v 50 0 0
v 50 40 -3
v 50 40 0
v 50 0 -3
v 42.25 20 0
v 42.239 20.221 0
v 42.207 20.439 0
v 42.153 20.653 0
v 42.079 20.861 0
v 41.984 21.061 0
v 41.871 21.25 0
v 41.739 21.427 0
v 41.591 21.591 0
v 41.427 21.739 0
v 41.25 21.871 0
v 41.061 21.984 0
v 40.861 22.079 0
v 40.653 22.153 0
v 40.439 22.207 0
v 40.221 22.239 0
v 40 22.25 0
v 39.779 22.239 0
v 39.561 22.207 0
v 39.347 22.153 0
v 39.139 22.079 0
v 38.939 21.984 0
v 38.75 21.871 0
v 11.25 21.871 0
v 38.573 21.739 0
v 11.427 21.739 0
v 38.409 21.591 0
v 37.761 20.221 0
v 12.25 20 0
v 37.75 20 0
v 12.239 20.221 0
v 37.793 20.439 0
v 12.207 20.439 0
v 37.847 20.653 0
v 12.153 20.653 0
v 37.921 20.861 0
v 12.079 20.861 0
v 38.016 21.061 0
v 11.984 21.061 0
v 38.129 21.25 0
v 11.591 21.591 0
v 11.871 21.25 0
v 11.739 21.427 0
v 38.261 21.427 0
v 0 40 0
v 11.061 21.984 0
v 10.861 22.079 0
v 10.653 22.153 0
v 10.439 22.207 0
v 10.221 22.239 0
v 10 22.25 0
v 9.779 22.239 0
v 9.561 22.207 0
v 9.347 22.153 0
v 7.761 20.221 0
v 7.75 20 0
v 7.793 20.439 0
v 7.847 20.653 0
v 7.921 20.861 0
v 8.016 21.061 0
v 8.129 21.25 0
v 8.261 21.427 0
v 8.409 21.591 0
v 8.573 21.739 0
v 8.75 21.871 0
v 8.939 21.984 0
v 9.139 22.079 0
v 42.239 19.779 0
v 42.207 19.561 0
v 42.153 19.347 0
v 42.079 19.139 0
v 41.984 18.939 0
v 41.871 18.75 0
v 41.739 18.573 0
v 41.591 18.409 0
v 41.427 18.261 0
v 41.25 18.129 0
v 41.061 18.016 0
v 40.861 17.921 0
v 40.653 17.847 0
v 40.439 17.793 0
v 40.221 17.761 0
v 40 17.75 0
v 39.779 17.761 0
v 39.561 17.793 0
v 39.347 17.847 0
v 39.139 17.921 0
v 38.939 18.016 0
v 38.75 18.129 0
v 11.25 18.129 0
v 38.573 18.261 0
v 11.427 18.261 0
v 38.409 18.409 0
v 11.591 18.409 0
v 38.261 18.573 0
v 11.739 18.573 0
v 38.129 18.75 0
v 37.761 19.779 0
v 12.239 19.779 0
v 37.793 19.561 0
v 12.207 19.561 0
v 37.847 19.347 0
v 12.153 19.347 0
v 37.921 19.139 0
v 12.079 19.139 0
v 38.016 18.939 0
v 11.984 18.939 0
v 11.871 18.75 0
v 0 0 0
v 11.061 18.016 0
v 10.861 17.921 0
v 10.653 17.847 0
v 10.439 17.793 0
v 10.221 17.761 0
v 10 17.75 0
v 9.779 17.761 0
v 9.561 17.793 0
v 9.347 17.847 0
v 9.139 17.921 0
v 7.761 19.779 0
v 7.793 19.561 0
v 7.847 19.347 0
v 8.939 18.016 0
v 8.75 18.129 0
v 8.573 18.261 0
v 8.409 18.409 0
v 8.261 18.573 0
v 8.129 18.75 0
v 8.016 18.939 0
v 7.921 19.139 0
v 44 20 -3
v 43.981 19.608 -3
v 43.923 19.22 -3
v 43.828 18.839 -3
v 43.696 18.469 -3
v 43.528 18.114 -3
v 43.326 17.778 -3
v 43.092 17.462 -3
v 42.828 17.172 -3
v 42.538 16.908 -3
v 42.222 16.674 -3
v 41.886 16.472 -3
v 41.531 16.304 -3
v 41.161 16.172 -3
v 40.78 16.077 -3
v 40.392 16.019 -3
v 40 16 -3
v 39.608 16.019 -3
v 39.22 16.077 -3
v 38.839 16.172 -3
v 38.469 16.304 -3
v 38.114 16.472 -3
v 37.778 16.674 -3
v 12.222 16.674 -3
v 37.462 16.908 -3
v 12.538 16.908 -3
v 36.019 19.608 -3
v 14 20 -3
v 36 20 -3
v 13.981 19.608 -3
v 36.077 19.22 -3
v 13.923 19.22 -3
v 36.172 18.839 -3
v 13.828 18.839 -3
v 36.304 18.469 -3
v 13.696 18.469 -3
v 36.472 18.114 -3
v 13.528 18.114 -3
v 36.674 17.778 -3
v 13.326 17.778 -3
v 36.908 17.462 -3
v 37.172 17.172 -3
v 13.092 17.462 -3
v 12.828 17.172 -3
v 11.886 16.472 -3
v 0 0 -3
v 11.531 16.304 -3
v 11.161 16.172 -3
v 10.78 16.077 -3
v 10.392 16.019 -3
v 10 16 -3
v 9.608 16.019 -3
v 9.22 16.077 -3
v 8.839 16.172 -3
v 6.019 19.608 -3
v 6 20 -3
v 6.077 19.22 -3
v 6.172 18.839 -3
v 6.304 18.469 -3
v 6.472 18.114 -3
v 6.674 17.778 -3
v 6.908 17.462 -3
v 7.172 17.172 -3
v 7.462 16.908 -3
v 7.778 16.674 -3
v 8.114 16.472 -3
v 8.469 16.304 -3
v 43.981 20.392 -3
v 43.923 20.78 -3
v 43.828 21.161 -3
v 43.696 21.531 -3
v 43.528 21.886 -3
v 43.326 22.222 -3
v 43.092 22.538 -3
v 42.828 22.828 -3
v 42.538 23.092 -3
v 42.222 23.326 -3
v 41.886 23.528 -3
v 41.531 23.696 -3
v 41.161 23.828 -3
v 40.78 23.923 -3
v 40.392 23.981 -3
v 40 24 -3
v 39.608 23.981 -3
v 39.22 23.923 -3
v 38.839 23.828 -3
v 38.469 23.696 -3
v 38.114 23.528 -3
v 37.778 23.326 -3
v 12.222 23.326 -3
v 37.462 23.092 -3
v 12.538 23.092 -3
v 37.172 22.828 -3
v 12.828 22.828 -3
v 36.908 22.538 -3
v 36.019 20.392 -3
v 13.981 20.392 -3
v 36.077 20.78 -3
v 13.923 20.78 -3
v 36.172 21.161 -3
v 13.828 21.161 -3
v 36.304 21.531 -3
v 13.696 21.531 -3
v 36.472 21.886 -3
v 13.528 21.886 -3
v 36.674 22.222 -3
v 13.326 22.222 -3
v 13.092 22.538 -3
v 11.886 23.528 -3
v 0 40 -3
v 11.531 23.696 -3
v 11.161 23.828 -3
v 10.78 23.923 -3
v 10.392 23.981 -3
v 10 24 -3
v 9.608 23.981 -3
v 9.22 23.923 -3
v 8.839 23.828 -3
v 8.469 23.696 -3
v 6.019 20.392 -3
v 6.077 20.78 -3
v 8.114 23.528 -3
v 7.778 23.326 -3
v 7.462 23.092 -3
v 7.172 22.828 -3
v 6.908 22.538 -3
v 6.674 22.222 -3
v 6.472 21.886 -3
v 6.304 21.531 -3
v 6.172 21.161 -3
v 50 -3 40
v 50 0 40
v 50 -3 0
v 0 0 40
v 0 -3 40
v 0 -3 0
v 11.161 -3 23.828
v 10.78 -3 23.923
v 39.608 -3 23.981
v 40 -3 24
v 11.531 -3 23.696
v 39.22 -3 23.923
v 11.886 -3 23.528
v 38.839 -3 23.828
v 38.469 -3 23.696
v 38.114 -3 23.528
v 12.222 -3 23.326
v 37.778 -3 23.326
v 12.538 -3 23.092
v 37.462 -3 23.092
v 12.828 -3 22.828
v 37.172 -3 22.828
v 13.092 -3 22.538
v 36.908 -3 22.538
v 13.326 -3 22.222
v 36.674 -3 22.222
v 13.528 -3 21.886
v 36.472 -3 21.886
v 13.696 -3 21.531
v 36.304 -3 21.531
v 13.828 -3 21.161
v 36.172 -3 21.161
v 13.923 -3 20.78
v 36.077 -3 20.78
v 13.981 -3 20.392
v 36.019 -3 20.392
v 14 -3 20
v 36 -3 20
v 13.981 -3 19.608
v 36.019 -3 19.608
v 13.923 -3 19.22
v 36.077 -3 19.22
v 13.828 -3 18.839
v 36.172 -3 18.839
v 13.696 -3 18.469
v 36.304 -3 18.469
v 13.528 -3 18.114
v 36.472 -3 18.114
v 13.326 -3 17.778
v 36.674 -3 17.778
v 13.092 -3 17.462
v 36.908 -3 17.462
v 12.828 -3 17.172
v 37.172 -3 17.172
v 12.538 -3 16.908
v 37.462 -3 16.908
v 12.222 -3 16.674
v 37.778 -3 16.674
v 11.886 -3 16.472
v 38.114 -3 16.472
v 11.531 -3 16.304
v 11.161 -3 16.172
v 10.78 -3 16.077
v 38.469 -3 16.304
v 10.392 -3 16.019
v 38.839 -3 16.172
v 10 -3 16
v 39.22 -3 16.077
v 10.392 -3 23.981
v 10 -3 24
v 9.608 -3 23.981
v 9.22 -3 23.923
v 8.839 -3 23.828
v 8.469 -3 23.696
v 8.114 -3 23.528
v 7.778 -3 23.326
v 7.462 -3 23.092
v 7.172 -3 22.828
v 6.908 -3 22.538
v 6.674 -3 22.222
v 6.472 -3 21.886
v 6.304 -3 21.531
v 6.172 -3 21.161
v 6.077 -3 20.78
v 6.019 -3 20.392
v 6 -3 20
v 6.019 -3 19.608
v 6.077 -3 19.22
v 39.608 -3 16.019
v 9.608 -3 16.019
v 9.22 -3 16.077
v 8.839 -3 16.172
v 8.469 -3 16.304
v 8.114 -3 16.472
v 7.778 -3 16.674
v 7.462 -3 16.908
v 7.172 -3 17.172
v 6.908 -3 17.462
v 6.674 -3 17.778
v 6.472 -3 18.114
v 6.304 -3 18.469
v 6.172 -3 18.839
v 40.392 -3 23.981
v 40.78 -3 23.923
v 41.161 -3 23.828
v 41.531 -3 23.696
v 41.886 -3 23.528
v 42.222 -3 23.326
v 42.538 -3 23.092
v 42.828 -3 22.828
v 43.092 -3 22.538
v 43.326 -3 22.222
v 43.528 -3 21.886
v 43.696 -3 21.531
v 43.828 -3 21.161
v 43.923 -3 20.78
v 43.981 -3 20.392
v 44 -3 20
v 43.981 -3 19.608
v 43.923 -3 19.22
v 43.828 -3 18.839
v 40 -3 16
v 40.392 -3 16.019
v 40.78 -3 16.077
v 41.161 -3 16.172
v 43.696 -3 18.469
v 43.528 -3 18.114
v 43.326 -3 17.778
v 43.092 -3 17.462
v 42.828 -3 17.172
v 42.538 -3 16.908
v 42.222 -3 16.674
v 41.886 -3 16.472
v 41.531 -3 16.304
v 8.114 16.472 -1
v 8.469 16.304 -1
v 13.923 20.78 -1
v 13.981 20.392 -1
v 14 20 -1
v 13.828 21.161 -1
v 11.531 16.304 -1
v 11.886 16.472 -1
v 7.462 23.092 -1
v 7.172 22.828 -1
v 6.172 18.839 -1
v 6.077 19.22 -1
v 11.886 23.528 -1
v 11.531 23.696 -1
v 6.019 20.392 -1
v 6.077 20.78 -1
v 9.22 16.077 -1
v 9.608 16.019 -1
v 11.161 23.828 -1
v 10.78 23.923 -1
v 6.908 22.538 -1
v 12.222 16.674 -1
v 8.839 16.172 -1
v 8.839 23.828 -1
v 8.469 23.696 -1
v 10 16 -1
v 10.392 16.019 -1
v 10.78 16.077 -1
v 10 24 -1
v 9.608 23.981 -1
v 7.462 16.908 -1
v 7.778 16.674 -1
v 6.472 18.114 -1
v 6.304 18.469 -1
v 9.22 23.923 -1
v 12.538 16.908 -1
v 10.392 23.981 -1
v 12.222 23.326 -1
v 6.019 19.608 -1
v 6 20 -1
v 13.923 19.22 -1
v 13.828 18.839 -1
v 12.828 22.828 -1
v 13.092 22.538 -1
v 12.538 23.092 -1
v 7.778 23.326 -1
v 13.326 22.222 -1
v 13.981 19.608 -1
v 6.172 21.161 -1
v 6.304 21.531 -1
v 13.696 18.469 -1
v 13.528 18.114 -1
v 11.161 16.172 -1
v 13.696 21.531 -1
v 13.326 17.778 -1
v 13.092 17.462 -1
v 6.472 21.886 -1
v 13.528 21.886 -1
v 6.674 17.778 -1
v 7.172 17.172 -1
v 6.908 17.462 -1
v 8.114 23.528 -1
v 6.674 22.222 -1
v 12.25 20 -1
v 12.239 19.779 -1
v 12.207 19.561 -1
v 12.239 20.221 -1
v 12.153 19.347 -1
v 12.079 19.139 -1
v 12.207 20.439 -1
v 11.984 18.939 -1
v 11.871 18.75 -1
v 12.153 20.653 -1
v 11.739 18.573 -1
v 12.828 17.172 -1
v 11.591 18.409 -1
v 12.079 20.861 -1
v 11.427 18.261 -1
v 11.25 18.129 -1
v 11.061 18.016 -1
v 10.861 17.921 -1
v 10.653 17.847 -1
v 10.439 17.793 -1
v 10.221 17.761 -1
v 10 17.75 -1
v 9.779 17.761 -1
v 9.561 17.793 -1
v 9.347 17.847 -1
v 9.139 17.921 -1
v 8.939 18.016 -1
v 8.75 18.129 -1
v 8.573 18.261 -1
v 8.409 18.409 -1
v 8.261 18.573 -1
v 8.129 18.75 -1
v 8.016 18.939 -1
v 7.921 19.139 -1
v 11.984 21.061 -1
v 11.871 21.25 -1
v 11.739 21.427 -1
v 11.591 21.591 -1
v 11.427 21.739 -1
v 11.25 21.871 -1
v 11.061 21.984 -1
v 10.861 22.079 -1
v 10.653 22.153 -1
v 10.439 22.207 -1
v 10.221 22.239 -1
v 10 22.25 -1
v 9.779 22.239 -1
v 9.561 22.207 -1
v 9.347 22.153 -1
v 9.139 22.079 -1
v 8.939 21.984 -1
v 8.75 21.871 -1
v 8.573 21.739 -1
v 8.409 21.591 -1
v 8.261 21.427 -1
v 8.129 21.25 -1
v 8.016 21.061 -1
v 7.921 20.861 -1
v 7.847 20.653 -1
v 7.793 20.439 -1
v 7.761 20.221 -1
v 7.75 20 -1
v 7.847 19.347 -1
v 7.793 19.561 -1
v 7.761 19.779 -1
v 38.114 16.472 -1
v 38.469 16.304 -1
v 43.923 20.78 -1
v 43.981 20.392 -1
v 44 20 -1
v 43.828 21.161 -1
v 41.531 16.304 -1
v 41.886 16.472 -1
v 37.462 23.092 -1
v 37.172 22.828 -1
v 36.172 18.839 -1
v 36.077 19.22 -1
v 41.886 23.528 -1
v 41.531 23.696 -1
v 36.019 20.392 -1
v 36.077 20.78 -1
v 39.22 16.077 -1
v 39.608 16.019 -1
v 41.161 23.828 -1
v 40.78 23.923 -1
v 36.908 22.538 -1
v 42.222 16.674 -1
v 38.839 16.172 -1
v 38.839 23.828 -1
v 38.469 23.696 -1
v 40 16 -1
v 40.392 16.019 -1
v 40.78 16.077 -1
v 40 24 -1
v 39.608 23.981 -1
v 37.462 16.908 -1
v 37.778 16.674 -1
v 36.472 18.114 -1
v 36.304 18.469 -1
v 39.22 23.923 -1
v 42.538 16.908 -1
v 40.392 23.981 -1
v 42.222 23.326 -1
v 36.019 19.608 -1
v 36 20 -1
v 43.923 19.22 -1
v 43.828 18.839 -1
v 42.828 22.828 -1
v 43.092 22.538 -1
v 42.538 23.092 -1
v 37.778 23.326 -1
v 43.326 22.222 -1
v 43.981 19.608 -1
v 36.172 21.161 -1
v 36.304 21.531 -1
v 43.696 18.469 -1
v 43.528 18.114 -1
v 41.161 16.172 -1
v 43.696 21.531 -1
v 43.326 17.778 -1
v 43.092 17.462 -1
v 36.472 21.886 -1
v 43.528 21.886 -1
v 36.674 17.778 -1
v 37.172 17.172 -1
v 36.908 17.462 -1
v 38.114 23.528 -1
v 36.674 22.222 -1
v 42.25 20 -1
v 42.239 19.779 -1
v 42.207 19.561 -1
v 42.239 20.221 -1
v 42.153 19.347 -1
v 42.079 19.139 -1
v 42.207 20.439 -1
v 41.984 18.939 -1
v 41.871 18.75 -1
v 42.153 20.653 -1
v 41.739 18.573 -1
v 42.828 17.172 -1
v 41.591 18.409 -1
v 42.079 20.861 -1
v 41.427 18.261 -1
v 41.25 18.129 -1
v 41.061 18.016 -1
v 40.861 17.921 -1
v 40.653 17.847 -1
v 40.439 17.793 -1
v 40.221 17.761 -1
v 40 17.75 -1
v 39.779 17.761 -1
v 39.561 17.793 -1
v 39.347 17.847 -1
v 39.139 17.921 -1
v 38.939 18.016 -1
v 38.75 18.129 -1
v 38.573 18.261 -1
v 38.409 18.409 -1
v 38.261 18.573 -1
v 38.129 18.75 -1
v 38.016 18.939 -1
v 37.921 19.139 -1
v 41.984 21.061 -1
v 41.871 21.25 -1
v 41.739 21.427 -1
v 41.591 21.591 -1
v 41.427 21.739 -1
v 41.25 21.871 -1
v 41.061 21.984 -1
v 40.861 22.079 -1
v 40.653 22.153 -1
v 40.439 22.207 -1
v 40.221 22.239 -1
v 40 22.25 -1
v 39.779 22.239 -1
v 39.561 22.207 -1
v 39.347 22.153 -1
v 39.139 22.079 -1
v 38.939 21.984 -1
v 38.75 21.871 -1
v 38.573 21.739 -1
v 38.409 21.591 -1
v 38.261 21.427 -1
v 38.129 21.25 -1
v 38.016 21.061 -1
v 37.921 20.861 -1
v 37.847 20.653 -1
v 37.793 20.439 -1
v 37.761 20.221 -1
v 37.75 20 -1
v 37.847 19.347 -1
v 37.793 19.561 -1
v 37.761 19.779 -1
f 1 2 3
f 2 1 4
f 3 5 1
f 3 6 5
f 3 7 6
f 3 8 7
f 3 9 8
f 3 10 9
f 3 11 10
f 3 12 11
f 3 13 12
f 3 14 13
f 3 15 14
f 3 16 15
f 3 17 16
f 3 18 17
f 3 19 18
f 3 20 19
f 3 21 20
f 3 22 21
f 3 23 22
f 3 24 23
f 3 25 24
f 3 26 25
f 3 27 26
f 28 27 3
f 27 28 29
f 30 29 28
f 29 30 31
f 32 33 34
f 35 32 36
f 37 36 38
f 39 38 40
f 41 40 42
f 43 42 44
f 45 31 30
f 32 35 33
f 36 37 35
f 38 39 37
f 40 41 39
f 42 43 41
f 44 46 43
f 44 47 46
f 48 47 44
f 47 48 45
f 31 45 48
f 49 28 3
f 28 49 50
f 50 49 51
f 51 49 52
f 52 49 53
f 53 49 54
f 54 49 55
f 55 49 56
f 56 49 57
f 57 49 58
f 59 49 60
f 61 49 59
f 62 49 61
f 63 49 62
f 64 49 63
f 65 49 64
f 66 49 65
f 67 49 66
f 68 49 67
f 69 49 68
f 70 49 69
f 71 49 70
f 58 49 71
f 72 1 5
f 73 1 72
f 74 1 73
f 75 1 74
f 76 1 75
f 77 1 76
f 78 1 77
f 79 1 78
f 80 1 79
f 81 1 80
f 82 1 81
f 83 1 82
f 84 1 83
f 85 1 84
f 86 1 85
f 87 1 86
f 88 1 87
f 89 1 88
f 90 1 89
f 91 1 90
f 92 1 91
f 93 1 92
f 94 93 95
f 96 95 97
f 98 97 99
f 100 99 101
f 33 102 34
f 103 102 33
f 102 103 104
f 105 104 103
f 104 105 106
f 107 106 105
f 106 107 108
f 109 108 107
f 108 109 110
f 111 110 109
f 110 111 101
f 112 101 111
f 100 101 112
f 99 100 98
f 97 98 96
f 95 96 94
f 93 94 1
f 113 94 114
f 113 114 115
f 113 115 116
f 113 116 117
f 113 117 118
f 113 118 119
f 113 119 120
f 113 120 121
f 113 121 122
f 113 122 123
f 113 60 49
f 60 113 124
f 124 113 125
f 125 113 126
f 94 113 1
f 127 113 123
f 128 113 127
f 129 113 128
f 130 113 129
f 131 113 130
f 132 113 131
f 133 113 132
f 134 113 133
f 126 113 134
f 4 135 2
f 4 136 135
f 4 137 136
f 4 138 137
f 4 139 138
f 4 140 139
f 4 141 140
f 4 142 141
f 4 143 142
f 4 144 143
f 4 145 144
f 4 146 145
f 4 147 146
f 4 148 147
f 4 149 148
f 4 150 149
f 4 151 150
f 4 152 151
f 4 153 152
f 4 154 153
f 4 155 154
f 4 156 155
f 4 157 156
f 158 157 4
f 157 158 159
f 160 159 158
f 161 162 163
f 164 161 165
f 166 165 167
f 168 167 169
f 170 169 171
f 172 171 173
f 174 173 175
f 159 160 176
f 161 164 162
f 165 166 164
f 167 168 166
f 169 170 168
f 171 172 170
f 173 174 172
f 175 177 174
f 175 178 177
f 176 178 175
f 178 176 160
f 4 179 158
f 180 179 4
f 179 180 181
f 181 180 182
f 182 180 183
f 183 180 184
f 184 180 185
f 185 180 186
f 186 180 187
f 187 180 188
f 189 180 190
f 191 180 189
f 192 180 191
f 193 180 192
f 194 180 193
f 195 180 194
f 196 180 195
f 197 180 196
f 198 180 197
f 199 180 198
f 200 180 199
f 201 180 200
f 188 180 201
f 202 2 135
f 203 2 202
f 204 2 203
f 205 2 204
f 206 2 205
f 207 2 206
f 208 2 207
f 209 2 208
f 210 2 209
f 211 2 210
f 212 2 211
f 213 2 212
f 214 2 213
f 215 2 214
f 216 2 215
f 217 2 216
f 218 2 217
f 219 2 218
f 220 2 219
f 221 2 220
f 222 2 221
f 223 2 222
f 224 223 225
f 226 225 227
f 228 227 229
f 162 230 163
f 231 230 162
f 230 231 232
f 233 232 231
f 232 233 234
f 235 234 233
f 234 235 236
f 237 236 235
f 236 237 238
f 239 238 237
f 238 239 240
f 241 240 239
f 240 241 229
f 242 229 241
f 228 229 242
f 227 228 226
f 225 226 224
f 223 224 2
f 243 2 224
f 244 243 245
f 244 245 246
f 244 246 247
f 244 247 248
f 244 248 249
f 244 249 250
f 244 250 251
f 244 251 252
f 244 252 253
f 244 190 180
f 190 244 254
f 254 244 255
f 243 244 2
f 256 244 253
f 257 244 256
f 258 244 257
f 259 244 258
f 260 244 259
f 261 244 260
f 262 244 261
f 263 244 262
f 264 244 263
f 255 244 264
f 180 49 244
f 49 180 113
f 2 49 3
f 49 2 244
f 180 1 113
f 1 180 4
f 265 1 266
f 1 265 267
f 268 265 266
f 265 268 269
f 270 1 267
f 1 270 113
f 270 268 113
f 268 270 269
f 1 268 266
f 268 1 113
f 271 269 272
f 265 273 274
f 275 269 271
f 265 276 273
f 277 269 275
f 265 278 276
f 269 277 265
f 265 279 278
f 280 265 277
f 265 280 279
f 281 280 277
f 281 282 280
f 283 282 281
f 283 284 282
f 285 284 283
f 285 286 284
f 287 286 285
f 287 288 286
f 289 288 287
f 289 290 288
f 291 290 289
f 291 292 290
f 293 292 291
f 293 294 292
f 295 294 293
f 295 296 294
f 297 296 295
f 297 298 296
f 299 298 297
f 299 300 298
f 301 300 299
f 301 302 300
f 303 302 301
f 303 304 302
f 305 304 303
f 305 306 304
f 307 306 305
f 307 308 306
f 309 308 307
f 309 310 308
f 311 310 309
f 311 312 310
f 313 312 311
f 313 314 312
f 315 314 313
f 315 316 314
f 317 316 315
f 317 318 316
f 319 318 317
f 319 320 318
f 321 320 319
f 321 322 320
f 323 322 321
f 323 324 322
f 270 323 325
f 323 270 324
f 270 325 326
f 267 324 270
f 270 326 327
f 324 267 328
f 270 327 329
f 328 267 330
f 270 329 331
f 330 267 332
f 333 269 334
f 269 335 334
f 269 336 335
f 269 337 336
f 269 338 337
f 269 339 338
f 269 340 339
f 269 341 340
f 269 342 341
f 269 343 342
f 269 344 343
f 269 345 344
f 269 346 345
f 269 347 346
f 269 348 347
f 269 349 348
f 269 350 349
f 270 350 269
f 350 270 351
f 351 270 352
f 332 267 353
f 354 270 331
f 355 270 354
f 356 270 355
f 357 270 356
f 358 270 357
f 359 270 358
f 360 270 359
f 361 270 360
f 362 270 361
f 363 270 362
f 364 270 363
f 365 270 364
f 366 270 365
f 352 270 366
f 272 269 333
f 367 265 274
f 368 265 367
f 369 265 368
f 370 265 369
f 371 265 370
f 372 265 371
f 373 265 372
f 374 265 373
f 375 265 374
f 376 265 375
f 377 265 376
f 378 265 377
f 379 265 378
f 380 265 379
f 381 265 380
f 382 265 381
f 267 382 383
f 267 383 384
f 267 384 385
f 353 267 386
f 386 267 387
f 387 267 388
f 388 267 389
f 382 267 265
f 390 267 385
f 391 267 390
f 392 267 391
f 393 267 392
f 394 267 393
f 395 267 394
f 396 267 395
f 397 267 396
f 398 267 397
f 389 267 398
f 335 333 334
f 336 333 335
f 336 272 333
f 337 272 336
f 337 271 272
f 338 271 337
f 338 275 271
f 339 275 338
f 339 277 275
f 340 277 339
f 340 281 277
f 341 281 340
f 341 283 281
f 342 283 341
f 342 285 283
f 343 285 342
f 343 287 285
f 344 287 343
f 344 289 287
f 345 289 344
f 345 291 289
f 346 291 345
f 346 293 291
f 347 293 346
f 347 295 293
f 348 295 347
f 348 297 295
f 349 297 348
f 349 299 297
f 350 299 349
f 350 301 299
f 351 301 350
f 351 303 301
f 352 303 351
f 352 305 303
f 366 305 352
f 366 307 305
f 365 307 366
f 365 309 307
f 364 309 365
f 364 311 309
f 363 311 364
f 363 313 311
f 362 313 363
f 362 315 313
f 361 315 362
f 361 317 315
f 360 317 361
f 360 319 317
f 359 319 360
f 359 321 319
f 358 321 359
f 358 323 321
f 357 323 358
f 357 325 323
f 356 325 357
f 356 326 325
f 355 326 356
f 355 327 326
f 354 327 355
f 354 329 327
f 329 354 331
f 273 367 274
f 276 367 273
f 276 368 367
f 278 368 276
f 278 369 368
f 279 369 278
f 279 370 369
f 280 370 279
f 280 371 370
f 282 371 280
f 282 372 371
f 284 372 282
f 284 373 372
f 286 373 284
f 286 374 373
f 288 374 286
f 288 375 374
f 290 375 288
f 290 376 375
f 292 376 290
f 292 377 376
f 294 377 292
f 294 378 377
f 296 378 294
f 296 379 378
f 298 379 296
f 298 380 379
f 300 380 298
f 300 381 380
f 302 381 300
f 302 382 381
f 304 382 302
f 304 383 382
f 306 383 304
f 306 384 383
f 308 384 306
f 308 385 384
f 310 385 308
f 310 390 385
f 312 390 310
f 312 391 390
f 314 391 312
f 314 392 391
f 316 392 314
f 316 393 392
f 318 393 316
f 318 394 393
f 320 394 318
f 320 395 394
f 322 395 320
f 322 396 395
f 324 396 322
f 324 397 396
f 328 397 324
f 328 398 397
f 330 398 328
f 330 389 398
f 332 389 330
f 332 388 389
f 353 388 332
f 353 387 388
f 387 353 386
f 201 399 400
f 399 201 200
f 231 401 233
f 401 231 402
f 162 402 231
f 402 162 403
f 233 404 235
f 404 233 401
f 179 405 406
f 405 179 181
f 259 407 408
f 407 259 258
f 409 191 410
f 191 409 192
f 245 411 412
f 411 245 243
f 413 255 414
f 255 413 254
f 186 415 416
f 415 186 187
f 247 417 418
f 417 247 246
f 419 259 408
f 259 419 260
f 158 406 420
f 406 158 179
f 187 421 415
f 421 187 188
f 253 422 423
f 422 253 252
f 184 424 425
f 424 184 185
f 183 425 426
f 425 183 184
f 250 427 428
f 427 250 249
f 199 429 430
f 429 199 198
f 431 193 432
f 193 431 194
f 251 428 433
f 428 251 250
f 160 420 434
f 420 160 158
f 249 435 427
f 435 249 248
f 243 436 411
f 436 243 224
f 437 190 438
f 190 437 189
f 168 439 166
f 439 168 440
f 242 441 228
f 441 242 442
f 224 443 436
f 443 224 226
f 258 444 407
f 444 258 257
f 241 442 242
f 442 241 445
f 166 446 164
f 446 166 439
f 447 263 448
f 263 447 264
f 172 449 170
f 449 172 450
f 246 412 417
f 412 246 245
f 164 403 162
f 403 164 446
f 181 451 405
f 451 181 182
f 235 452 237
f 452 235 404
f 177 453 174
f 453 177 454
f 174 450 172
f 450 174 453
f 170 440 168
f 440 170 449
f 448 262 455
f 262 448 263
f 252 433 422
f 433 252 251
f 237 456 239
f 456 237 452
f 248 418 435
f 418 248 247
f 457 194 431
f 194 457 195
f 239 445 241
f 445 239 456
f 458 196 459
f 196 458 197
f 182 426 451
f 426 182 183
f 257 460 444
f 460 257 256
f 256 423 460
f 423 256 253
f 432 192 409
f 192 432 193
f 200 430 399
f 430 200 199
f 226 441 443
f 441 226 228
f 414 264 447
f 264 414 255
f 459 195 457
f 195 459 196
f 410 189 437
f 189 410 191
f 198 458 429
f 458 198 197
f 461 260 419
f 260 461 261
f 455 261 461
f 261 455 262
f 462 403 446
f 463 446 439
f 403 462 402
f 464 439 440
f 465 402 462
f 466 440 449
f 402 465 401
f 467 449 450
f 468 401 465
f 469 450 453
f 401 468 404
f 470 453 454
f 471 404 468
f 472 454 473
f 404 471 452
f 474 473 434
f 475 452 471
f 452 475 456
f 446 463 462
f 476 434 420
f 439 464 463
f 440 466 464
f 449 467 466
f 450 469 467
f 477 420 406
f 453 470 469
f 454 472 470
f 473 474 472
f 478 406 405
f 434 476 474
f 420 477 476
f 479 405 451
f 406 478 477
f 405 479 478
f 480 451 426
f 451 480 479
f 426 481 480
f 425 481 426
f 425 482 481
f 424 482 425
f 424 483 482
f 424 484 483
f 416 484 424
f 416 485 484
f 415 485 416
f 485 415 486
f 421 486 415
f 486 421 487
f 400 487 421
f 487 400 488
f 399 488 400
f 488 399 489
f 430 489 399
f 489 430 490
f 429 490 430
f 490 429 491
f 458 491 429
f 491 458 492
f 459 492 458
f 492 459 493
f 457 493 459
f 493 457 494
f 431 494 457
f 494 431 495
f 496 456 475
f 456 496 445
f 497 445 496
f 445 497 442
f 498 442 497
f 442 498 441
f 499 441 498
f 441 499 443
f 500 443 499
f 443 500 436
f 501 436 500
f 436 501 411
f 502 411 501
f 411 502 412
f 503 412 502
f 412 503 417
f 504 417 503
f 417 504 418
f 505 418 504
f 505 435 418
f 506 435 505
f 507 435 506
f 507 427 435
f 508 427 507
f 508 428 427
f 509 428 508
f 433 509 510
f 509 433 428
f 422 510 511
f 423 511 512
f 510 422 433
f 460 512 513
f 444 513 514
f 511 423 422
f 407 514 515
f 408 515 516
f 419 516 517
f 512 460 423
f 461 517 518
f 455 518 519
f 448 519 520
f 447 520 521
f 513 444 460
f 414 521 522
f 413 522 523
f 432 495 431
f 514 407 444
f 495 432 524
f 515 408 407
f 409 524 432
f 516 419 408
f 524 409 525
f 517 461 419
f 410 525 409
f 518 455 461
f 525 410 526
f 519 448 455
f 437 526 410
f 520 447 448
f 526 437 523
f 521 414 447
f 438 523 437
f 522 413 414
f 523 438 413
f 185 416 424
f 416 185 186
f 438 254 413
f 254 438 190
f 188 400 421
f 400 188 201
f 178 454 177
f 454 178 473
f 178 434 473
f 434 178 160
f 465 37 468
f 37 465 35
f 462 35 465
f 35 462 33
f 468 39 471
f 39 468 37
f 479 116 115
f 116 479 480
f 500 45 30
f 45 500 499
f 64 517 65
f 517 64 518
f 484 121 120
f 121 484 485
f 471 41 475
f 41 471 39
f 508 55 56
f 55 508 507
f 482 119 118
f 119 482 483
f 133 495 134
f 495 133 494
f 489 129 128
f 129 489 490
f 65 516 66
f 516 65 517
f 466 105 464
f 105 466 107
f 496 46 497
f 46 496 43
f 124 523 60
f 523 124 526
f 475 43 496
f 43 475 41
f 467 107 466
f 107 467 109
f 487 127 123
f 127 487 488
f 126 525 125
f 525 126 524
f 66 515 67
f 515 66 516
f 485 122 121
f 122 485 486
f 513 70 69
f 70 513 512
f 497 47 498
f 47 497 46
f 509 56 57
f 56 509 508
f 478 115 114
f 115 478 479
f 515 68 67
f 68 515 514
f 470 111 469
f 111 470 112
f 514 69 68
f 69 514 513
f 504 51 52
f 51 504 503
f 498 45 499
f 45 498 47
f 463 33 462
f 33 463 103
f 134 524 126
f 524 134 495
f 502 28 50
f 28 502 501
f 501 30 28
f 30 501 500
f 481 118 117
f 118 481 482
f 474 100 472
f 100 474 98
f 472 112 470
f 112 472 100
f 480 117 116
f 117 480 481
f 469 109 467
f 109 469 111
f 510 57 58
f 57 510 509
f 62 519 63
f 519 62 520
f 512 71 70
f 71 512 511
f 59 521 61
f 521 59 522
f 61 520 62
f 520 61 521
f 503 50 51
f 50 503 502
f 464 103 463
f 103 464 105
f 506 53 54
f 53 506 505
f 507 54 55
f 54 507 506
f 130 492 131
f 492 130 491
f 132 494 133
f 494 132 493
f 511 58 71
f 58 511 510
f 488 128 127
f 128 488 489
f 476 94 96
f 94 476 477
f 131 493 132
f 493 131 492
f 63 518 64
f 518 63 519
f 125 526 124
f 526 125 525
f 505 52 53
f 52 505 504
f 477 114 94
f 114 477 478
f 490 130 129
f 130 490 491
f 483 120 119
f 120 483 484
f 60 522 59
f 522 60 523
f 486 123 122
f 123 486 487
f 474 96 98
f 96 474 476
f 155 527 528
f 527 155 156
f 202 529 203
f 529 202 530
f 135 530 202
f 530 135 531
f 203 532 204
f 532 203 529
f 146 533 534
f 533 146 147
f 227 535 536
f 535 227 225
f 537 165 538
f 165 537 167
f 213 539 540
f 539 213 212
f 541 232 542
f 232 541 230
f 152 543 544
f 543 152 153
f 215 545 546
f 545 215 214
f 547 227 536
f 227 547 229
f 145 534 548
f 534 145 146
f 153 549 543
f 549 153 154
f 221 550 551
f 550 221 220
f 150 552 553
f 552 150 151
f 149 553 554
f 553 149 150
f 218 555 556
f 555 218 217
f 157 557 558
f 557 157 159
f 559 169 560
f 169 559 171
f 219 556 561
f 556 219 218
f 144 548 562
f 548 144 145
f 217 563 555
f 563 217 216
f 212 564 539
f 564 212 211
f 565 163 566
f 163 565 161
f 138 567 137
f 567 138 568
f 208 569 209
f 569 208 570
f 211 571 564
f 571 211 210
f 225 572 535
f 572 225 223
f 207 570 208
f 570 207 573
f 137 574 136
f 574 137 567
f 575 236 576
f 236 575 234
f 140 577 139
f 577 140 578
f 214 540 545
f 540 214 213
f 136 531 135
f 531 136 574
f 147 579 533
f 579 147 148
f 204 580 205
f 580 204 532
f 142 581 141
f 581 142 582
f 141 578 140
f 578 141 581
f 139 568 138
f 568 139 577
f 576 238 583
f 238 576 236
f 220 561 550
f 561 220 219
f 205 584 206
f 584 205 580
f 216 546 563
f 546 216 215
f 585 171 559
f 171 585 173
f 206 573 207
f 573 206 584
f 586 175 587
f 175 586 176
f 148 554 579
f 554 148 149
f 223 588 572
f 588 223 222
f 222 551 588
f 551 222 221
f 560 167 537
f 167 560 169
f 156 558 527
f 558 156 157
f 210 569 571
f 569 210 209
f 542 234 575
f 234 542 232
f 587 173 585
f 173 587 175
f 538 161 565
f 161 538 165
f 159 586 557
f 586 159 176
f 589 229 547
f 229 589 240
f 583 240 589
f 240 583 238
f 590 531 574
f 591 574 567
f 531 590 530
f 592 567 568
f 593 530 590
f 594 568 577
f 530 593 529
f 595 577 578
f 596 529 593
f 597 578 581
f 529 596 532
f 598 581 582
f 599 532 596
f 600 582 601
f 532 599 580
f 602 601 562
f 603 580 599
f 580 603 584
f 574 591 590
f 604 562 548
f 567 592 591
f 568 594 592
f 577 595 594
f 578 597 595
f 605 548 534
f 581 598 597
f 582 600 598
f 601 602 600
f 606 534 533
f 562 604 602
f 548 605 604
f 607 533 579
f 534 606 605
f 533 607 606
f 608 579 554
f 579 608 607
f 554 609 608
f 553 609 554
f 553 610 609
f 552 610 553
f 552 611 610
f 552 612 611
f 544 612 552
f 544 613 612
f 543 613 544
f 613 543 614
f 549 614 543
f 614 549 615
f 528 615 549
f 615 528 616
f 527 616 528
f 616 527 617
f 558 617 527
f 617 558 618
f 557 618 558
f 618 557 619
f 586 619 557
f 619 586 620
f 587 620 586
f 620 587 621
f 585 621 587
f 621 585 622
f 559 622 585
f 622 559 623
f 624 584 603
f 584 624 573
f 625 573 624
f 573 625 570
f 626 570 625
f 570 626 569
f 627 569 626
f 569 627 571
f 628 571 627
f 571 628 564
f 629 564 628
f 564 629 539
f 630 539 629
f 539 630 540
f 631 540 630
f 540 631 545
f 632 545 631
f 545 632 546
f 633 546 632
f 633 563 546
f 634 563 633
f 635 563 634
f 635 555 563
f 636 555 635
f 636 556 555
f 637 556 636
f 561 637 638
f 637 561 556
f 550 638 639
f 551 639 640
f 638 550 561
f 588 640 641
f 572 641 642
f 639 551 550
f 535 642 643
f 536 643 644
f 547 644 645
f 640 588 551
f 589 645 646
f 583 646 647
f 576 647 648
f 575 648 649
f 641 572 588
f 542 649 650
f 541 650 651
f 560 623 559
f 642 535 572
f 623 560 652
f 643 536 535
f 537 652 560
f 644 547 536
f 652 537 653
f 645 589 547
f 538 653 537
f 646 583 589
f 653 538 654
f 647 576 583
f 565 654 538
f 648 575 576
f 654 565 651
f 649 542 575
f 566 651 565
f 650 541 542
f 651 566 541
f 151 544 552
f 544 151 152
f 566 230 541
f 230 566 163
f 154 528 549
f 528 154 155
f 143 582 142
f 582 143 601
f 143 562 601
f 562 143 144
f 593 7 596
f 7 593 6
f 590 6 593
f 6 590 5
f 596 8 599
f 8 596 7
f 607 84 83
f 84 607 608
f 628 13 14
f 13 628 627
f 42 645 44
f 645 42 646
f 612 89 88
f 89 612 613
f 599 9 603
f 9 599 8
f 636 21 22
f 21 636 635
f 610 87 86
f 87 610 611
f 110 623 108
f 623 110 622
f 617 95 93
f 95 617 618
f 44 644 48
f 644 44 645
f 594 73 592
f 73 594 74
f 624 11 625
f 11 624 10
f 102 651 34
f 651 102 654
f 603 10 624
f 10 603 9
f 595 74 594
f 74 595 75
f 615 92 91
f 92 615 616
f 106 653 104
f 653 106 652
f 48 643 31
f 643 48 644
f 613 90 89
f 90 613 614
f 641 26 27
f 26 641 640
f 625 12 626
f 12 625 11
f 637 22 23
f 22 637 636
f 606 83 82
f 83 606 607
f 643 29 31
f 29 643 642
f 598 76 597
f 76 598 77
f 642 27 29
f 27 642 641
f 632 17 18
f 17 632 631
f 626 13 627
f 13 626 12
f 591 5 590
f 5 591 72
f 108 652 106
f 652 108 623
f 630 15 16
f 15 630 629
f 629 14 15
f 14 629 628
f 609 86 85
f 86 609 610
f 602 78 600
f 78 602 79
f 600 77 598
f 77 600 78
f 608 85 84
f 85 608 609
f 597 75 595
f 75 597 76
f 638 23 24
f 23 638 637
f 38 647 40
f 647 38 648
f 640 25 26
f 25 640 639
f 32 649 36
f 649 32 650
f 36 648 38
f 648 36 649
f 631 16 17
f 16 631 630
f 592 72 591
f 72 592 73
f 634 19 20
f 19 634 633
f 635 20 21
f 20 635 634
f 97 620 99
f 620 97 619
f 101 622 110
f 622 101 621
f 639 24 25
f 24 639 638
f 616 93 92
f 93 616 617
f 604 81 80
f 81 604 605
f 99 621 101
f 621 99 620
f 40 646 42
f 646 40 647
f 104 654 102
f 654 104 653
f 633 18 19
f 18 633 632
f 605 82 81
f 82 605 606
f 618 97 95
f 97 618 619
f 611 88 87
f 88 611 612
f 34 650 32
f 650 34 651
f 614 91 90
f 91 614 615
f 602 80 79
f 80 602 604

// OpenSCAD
// L-bracket with countersunk M4 holes
$fn = 64;

thickness = 3;
width     = 50;
length    = 40;          // depth of horizontal / height of vertical flange
hole_d    = 4.5;
sink_d    = 8;
sink_h    = 2;
xholes    = [10, width-10];

// Countersunk hole, axis along +Z, outer face at z = 0
module csunk(th = thickness) {
    // countersink
    cylinder(d = sink_d, h = sink_h, center = false);
    // through-hole (extra length to guarantee cut-through)
    translate([0, 0, sink_h])
        cylinder(d = hole_d, h = th + 1, center = false);
}

difference() {
    // -----------------------------------------------------------------
    // Solid bracket
    union() {
        // Horizontal flange (extends +Y, thickness in -Z)
        translate([0, 0, -thickness])
            cube([width, length, thickness], center = false);

        // Vertical flange (extends +Z, thickness in -Y)
        translate([0, -thickness, 0])
            cube([width, thickness, length], center = false);
    }

    // -----------------------------------------------------------------
    // Holes – horizontal flange (outer face at Z = -thickness)
    for (x = xholes)
        translate([x, length/2, -thickness])
            csunk();

    // Holes – vertical flange (outer face at Y = -thickness)
    for (x = xholes)
        translate([x, -thickness, length/2])
            rotate([90, 0, 0]) csunk();
}
